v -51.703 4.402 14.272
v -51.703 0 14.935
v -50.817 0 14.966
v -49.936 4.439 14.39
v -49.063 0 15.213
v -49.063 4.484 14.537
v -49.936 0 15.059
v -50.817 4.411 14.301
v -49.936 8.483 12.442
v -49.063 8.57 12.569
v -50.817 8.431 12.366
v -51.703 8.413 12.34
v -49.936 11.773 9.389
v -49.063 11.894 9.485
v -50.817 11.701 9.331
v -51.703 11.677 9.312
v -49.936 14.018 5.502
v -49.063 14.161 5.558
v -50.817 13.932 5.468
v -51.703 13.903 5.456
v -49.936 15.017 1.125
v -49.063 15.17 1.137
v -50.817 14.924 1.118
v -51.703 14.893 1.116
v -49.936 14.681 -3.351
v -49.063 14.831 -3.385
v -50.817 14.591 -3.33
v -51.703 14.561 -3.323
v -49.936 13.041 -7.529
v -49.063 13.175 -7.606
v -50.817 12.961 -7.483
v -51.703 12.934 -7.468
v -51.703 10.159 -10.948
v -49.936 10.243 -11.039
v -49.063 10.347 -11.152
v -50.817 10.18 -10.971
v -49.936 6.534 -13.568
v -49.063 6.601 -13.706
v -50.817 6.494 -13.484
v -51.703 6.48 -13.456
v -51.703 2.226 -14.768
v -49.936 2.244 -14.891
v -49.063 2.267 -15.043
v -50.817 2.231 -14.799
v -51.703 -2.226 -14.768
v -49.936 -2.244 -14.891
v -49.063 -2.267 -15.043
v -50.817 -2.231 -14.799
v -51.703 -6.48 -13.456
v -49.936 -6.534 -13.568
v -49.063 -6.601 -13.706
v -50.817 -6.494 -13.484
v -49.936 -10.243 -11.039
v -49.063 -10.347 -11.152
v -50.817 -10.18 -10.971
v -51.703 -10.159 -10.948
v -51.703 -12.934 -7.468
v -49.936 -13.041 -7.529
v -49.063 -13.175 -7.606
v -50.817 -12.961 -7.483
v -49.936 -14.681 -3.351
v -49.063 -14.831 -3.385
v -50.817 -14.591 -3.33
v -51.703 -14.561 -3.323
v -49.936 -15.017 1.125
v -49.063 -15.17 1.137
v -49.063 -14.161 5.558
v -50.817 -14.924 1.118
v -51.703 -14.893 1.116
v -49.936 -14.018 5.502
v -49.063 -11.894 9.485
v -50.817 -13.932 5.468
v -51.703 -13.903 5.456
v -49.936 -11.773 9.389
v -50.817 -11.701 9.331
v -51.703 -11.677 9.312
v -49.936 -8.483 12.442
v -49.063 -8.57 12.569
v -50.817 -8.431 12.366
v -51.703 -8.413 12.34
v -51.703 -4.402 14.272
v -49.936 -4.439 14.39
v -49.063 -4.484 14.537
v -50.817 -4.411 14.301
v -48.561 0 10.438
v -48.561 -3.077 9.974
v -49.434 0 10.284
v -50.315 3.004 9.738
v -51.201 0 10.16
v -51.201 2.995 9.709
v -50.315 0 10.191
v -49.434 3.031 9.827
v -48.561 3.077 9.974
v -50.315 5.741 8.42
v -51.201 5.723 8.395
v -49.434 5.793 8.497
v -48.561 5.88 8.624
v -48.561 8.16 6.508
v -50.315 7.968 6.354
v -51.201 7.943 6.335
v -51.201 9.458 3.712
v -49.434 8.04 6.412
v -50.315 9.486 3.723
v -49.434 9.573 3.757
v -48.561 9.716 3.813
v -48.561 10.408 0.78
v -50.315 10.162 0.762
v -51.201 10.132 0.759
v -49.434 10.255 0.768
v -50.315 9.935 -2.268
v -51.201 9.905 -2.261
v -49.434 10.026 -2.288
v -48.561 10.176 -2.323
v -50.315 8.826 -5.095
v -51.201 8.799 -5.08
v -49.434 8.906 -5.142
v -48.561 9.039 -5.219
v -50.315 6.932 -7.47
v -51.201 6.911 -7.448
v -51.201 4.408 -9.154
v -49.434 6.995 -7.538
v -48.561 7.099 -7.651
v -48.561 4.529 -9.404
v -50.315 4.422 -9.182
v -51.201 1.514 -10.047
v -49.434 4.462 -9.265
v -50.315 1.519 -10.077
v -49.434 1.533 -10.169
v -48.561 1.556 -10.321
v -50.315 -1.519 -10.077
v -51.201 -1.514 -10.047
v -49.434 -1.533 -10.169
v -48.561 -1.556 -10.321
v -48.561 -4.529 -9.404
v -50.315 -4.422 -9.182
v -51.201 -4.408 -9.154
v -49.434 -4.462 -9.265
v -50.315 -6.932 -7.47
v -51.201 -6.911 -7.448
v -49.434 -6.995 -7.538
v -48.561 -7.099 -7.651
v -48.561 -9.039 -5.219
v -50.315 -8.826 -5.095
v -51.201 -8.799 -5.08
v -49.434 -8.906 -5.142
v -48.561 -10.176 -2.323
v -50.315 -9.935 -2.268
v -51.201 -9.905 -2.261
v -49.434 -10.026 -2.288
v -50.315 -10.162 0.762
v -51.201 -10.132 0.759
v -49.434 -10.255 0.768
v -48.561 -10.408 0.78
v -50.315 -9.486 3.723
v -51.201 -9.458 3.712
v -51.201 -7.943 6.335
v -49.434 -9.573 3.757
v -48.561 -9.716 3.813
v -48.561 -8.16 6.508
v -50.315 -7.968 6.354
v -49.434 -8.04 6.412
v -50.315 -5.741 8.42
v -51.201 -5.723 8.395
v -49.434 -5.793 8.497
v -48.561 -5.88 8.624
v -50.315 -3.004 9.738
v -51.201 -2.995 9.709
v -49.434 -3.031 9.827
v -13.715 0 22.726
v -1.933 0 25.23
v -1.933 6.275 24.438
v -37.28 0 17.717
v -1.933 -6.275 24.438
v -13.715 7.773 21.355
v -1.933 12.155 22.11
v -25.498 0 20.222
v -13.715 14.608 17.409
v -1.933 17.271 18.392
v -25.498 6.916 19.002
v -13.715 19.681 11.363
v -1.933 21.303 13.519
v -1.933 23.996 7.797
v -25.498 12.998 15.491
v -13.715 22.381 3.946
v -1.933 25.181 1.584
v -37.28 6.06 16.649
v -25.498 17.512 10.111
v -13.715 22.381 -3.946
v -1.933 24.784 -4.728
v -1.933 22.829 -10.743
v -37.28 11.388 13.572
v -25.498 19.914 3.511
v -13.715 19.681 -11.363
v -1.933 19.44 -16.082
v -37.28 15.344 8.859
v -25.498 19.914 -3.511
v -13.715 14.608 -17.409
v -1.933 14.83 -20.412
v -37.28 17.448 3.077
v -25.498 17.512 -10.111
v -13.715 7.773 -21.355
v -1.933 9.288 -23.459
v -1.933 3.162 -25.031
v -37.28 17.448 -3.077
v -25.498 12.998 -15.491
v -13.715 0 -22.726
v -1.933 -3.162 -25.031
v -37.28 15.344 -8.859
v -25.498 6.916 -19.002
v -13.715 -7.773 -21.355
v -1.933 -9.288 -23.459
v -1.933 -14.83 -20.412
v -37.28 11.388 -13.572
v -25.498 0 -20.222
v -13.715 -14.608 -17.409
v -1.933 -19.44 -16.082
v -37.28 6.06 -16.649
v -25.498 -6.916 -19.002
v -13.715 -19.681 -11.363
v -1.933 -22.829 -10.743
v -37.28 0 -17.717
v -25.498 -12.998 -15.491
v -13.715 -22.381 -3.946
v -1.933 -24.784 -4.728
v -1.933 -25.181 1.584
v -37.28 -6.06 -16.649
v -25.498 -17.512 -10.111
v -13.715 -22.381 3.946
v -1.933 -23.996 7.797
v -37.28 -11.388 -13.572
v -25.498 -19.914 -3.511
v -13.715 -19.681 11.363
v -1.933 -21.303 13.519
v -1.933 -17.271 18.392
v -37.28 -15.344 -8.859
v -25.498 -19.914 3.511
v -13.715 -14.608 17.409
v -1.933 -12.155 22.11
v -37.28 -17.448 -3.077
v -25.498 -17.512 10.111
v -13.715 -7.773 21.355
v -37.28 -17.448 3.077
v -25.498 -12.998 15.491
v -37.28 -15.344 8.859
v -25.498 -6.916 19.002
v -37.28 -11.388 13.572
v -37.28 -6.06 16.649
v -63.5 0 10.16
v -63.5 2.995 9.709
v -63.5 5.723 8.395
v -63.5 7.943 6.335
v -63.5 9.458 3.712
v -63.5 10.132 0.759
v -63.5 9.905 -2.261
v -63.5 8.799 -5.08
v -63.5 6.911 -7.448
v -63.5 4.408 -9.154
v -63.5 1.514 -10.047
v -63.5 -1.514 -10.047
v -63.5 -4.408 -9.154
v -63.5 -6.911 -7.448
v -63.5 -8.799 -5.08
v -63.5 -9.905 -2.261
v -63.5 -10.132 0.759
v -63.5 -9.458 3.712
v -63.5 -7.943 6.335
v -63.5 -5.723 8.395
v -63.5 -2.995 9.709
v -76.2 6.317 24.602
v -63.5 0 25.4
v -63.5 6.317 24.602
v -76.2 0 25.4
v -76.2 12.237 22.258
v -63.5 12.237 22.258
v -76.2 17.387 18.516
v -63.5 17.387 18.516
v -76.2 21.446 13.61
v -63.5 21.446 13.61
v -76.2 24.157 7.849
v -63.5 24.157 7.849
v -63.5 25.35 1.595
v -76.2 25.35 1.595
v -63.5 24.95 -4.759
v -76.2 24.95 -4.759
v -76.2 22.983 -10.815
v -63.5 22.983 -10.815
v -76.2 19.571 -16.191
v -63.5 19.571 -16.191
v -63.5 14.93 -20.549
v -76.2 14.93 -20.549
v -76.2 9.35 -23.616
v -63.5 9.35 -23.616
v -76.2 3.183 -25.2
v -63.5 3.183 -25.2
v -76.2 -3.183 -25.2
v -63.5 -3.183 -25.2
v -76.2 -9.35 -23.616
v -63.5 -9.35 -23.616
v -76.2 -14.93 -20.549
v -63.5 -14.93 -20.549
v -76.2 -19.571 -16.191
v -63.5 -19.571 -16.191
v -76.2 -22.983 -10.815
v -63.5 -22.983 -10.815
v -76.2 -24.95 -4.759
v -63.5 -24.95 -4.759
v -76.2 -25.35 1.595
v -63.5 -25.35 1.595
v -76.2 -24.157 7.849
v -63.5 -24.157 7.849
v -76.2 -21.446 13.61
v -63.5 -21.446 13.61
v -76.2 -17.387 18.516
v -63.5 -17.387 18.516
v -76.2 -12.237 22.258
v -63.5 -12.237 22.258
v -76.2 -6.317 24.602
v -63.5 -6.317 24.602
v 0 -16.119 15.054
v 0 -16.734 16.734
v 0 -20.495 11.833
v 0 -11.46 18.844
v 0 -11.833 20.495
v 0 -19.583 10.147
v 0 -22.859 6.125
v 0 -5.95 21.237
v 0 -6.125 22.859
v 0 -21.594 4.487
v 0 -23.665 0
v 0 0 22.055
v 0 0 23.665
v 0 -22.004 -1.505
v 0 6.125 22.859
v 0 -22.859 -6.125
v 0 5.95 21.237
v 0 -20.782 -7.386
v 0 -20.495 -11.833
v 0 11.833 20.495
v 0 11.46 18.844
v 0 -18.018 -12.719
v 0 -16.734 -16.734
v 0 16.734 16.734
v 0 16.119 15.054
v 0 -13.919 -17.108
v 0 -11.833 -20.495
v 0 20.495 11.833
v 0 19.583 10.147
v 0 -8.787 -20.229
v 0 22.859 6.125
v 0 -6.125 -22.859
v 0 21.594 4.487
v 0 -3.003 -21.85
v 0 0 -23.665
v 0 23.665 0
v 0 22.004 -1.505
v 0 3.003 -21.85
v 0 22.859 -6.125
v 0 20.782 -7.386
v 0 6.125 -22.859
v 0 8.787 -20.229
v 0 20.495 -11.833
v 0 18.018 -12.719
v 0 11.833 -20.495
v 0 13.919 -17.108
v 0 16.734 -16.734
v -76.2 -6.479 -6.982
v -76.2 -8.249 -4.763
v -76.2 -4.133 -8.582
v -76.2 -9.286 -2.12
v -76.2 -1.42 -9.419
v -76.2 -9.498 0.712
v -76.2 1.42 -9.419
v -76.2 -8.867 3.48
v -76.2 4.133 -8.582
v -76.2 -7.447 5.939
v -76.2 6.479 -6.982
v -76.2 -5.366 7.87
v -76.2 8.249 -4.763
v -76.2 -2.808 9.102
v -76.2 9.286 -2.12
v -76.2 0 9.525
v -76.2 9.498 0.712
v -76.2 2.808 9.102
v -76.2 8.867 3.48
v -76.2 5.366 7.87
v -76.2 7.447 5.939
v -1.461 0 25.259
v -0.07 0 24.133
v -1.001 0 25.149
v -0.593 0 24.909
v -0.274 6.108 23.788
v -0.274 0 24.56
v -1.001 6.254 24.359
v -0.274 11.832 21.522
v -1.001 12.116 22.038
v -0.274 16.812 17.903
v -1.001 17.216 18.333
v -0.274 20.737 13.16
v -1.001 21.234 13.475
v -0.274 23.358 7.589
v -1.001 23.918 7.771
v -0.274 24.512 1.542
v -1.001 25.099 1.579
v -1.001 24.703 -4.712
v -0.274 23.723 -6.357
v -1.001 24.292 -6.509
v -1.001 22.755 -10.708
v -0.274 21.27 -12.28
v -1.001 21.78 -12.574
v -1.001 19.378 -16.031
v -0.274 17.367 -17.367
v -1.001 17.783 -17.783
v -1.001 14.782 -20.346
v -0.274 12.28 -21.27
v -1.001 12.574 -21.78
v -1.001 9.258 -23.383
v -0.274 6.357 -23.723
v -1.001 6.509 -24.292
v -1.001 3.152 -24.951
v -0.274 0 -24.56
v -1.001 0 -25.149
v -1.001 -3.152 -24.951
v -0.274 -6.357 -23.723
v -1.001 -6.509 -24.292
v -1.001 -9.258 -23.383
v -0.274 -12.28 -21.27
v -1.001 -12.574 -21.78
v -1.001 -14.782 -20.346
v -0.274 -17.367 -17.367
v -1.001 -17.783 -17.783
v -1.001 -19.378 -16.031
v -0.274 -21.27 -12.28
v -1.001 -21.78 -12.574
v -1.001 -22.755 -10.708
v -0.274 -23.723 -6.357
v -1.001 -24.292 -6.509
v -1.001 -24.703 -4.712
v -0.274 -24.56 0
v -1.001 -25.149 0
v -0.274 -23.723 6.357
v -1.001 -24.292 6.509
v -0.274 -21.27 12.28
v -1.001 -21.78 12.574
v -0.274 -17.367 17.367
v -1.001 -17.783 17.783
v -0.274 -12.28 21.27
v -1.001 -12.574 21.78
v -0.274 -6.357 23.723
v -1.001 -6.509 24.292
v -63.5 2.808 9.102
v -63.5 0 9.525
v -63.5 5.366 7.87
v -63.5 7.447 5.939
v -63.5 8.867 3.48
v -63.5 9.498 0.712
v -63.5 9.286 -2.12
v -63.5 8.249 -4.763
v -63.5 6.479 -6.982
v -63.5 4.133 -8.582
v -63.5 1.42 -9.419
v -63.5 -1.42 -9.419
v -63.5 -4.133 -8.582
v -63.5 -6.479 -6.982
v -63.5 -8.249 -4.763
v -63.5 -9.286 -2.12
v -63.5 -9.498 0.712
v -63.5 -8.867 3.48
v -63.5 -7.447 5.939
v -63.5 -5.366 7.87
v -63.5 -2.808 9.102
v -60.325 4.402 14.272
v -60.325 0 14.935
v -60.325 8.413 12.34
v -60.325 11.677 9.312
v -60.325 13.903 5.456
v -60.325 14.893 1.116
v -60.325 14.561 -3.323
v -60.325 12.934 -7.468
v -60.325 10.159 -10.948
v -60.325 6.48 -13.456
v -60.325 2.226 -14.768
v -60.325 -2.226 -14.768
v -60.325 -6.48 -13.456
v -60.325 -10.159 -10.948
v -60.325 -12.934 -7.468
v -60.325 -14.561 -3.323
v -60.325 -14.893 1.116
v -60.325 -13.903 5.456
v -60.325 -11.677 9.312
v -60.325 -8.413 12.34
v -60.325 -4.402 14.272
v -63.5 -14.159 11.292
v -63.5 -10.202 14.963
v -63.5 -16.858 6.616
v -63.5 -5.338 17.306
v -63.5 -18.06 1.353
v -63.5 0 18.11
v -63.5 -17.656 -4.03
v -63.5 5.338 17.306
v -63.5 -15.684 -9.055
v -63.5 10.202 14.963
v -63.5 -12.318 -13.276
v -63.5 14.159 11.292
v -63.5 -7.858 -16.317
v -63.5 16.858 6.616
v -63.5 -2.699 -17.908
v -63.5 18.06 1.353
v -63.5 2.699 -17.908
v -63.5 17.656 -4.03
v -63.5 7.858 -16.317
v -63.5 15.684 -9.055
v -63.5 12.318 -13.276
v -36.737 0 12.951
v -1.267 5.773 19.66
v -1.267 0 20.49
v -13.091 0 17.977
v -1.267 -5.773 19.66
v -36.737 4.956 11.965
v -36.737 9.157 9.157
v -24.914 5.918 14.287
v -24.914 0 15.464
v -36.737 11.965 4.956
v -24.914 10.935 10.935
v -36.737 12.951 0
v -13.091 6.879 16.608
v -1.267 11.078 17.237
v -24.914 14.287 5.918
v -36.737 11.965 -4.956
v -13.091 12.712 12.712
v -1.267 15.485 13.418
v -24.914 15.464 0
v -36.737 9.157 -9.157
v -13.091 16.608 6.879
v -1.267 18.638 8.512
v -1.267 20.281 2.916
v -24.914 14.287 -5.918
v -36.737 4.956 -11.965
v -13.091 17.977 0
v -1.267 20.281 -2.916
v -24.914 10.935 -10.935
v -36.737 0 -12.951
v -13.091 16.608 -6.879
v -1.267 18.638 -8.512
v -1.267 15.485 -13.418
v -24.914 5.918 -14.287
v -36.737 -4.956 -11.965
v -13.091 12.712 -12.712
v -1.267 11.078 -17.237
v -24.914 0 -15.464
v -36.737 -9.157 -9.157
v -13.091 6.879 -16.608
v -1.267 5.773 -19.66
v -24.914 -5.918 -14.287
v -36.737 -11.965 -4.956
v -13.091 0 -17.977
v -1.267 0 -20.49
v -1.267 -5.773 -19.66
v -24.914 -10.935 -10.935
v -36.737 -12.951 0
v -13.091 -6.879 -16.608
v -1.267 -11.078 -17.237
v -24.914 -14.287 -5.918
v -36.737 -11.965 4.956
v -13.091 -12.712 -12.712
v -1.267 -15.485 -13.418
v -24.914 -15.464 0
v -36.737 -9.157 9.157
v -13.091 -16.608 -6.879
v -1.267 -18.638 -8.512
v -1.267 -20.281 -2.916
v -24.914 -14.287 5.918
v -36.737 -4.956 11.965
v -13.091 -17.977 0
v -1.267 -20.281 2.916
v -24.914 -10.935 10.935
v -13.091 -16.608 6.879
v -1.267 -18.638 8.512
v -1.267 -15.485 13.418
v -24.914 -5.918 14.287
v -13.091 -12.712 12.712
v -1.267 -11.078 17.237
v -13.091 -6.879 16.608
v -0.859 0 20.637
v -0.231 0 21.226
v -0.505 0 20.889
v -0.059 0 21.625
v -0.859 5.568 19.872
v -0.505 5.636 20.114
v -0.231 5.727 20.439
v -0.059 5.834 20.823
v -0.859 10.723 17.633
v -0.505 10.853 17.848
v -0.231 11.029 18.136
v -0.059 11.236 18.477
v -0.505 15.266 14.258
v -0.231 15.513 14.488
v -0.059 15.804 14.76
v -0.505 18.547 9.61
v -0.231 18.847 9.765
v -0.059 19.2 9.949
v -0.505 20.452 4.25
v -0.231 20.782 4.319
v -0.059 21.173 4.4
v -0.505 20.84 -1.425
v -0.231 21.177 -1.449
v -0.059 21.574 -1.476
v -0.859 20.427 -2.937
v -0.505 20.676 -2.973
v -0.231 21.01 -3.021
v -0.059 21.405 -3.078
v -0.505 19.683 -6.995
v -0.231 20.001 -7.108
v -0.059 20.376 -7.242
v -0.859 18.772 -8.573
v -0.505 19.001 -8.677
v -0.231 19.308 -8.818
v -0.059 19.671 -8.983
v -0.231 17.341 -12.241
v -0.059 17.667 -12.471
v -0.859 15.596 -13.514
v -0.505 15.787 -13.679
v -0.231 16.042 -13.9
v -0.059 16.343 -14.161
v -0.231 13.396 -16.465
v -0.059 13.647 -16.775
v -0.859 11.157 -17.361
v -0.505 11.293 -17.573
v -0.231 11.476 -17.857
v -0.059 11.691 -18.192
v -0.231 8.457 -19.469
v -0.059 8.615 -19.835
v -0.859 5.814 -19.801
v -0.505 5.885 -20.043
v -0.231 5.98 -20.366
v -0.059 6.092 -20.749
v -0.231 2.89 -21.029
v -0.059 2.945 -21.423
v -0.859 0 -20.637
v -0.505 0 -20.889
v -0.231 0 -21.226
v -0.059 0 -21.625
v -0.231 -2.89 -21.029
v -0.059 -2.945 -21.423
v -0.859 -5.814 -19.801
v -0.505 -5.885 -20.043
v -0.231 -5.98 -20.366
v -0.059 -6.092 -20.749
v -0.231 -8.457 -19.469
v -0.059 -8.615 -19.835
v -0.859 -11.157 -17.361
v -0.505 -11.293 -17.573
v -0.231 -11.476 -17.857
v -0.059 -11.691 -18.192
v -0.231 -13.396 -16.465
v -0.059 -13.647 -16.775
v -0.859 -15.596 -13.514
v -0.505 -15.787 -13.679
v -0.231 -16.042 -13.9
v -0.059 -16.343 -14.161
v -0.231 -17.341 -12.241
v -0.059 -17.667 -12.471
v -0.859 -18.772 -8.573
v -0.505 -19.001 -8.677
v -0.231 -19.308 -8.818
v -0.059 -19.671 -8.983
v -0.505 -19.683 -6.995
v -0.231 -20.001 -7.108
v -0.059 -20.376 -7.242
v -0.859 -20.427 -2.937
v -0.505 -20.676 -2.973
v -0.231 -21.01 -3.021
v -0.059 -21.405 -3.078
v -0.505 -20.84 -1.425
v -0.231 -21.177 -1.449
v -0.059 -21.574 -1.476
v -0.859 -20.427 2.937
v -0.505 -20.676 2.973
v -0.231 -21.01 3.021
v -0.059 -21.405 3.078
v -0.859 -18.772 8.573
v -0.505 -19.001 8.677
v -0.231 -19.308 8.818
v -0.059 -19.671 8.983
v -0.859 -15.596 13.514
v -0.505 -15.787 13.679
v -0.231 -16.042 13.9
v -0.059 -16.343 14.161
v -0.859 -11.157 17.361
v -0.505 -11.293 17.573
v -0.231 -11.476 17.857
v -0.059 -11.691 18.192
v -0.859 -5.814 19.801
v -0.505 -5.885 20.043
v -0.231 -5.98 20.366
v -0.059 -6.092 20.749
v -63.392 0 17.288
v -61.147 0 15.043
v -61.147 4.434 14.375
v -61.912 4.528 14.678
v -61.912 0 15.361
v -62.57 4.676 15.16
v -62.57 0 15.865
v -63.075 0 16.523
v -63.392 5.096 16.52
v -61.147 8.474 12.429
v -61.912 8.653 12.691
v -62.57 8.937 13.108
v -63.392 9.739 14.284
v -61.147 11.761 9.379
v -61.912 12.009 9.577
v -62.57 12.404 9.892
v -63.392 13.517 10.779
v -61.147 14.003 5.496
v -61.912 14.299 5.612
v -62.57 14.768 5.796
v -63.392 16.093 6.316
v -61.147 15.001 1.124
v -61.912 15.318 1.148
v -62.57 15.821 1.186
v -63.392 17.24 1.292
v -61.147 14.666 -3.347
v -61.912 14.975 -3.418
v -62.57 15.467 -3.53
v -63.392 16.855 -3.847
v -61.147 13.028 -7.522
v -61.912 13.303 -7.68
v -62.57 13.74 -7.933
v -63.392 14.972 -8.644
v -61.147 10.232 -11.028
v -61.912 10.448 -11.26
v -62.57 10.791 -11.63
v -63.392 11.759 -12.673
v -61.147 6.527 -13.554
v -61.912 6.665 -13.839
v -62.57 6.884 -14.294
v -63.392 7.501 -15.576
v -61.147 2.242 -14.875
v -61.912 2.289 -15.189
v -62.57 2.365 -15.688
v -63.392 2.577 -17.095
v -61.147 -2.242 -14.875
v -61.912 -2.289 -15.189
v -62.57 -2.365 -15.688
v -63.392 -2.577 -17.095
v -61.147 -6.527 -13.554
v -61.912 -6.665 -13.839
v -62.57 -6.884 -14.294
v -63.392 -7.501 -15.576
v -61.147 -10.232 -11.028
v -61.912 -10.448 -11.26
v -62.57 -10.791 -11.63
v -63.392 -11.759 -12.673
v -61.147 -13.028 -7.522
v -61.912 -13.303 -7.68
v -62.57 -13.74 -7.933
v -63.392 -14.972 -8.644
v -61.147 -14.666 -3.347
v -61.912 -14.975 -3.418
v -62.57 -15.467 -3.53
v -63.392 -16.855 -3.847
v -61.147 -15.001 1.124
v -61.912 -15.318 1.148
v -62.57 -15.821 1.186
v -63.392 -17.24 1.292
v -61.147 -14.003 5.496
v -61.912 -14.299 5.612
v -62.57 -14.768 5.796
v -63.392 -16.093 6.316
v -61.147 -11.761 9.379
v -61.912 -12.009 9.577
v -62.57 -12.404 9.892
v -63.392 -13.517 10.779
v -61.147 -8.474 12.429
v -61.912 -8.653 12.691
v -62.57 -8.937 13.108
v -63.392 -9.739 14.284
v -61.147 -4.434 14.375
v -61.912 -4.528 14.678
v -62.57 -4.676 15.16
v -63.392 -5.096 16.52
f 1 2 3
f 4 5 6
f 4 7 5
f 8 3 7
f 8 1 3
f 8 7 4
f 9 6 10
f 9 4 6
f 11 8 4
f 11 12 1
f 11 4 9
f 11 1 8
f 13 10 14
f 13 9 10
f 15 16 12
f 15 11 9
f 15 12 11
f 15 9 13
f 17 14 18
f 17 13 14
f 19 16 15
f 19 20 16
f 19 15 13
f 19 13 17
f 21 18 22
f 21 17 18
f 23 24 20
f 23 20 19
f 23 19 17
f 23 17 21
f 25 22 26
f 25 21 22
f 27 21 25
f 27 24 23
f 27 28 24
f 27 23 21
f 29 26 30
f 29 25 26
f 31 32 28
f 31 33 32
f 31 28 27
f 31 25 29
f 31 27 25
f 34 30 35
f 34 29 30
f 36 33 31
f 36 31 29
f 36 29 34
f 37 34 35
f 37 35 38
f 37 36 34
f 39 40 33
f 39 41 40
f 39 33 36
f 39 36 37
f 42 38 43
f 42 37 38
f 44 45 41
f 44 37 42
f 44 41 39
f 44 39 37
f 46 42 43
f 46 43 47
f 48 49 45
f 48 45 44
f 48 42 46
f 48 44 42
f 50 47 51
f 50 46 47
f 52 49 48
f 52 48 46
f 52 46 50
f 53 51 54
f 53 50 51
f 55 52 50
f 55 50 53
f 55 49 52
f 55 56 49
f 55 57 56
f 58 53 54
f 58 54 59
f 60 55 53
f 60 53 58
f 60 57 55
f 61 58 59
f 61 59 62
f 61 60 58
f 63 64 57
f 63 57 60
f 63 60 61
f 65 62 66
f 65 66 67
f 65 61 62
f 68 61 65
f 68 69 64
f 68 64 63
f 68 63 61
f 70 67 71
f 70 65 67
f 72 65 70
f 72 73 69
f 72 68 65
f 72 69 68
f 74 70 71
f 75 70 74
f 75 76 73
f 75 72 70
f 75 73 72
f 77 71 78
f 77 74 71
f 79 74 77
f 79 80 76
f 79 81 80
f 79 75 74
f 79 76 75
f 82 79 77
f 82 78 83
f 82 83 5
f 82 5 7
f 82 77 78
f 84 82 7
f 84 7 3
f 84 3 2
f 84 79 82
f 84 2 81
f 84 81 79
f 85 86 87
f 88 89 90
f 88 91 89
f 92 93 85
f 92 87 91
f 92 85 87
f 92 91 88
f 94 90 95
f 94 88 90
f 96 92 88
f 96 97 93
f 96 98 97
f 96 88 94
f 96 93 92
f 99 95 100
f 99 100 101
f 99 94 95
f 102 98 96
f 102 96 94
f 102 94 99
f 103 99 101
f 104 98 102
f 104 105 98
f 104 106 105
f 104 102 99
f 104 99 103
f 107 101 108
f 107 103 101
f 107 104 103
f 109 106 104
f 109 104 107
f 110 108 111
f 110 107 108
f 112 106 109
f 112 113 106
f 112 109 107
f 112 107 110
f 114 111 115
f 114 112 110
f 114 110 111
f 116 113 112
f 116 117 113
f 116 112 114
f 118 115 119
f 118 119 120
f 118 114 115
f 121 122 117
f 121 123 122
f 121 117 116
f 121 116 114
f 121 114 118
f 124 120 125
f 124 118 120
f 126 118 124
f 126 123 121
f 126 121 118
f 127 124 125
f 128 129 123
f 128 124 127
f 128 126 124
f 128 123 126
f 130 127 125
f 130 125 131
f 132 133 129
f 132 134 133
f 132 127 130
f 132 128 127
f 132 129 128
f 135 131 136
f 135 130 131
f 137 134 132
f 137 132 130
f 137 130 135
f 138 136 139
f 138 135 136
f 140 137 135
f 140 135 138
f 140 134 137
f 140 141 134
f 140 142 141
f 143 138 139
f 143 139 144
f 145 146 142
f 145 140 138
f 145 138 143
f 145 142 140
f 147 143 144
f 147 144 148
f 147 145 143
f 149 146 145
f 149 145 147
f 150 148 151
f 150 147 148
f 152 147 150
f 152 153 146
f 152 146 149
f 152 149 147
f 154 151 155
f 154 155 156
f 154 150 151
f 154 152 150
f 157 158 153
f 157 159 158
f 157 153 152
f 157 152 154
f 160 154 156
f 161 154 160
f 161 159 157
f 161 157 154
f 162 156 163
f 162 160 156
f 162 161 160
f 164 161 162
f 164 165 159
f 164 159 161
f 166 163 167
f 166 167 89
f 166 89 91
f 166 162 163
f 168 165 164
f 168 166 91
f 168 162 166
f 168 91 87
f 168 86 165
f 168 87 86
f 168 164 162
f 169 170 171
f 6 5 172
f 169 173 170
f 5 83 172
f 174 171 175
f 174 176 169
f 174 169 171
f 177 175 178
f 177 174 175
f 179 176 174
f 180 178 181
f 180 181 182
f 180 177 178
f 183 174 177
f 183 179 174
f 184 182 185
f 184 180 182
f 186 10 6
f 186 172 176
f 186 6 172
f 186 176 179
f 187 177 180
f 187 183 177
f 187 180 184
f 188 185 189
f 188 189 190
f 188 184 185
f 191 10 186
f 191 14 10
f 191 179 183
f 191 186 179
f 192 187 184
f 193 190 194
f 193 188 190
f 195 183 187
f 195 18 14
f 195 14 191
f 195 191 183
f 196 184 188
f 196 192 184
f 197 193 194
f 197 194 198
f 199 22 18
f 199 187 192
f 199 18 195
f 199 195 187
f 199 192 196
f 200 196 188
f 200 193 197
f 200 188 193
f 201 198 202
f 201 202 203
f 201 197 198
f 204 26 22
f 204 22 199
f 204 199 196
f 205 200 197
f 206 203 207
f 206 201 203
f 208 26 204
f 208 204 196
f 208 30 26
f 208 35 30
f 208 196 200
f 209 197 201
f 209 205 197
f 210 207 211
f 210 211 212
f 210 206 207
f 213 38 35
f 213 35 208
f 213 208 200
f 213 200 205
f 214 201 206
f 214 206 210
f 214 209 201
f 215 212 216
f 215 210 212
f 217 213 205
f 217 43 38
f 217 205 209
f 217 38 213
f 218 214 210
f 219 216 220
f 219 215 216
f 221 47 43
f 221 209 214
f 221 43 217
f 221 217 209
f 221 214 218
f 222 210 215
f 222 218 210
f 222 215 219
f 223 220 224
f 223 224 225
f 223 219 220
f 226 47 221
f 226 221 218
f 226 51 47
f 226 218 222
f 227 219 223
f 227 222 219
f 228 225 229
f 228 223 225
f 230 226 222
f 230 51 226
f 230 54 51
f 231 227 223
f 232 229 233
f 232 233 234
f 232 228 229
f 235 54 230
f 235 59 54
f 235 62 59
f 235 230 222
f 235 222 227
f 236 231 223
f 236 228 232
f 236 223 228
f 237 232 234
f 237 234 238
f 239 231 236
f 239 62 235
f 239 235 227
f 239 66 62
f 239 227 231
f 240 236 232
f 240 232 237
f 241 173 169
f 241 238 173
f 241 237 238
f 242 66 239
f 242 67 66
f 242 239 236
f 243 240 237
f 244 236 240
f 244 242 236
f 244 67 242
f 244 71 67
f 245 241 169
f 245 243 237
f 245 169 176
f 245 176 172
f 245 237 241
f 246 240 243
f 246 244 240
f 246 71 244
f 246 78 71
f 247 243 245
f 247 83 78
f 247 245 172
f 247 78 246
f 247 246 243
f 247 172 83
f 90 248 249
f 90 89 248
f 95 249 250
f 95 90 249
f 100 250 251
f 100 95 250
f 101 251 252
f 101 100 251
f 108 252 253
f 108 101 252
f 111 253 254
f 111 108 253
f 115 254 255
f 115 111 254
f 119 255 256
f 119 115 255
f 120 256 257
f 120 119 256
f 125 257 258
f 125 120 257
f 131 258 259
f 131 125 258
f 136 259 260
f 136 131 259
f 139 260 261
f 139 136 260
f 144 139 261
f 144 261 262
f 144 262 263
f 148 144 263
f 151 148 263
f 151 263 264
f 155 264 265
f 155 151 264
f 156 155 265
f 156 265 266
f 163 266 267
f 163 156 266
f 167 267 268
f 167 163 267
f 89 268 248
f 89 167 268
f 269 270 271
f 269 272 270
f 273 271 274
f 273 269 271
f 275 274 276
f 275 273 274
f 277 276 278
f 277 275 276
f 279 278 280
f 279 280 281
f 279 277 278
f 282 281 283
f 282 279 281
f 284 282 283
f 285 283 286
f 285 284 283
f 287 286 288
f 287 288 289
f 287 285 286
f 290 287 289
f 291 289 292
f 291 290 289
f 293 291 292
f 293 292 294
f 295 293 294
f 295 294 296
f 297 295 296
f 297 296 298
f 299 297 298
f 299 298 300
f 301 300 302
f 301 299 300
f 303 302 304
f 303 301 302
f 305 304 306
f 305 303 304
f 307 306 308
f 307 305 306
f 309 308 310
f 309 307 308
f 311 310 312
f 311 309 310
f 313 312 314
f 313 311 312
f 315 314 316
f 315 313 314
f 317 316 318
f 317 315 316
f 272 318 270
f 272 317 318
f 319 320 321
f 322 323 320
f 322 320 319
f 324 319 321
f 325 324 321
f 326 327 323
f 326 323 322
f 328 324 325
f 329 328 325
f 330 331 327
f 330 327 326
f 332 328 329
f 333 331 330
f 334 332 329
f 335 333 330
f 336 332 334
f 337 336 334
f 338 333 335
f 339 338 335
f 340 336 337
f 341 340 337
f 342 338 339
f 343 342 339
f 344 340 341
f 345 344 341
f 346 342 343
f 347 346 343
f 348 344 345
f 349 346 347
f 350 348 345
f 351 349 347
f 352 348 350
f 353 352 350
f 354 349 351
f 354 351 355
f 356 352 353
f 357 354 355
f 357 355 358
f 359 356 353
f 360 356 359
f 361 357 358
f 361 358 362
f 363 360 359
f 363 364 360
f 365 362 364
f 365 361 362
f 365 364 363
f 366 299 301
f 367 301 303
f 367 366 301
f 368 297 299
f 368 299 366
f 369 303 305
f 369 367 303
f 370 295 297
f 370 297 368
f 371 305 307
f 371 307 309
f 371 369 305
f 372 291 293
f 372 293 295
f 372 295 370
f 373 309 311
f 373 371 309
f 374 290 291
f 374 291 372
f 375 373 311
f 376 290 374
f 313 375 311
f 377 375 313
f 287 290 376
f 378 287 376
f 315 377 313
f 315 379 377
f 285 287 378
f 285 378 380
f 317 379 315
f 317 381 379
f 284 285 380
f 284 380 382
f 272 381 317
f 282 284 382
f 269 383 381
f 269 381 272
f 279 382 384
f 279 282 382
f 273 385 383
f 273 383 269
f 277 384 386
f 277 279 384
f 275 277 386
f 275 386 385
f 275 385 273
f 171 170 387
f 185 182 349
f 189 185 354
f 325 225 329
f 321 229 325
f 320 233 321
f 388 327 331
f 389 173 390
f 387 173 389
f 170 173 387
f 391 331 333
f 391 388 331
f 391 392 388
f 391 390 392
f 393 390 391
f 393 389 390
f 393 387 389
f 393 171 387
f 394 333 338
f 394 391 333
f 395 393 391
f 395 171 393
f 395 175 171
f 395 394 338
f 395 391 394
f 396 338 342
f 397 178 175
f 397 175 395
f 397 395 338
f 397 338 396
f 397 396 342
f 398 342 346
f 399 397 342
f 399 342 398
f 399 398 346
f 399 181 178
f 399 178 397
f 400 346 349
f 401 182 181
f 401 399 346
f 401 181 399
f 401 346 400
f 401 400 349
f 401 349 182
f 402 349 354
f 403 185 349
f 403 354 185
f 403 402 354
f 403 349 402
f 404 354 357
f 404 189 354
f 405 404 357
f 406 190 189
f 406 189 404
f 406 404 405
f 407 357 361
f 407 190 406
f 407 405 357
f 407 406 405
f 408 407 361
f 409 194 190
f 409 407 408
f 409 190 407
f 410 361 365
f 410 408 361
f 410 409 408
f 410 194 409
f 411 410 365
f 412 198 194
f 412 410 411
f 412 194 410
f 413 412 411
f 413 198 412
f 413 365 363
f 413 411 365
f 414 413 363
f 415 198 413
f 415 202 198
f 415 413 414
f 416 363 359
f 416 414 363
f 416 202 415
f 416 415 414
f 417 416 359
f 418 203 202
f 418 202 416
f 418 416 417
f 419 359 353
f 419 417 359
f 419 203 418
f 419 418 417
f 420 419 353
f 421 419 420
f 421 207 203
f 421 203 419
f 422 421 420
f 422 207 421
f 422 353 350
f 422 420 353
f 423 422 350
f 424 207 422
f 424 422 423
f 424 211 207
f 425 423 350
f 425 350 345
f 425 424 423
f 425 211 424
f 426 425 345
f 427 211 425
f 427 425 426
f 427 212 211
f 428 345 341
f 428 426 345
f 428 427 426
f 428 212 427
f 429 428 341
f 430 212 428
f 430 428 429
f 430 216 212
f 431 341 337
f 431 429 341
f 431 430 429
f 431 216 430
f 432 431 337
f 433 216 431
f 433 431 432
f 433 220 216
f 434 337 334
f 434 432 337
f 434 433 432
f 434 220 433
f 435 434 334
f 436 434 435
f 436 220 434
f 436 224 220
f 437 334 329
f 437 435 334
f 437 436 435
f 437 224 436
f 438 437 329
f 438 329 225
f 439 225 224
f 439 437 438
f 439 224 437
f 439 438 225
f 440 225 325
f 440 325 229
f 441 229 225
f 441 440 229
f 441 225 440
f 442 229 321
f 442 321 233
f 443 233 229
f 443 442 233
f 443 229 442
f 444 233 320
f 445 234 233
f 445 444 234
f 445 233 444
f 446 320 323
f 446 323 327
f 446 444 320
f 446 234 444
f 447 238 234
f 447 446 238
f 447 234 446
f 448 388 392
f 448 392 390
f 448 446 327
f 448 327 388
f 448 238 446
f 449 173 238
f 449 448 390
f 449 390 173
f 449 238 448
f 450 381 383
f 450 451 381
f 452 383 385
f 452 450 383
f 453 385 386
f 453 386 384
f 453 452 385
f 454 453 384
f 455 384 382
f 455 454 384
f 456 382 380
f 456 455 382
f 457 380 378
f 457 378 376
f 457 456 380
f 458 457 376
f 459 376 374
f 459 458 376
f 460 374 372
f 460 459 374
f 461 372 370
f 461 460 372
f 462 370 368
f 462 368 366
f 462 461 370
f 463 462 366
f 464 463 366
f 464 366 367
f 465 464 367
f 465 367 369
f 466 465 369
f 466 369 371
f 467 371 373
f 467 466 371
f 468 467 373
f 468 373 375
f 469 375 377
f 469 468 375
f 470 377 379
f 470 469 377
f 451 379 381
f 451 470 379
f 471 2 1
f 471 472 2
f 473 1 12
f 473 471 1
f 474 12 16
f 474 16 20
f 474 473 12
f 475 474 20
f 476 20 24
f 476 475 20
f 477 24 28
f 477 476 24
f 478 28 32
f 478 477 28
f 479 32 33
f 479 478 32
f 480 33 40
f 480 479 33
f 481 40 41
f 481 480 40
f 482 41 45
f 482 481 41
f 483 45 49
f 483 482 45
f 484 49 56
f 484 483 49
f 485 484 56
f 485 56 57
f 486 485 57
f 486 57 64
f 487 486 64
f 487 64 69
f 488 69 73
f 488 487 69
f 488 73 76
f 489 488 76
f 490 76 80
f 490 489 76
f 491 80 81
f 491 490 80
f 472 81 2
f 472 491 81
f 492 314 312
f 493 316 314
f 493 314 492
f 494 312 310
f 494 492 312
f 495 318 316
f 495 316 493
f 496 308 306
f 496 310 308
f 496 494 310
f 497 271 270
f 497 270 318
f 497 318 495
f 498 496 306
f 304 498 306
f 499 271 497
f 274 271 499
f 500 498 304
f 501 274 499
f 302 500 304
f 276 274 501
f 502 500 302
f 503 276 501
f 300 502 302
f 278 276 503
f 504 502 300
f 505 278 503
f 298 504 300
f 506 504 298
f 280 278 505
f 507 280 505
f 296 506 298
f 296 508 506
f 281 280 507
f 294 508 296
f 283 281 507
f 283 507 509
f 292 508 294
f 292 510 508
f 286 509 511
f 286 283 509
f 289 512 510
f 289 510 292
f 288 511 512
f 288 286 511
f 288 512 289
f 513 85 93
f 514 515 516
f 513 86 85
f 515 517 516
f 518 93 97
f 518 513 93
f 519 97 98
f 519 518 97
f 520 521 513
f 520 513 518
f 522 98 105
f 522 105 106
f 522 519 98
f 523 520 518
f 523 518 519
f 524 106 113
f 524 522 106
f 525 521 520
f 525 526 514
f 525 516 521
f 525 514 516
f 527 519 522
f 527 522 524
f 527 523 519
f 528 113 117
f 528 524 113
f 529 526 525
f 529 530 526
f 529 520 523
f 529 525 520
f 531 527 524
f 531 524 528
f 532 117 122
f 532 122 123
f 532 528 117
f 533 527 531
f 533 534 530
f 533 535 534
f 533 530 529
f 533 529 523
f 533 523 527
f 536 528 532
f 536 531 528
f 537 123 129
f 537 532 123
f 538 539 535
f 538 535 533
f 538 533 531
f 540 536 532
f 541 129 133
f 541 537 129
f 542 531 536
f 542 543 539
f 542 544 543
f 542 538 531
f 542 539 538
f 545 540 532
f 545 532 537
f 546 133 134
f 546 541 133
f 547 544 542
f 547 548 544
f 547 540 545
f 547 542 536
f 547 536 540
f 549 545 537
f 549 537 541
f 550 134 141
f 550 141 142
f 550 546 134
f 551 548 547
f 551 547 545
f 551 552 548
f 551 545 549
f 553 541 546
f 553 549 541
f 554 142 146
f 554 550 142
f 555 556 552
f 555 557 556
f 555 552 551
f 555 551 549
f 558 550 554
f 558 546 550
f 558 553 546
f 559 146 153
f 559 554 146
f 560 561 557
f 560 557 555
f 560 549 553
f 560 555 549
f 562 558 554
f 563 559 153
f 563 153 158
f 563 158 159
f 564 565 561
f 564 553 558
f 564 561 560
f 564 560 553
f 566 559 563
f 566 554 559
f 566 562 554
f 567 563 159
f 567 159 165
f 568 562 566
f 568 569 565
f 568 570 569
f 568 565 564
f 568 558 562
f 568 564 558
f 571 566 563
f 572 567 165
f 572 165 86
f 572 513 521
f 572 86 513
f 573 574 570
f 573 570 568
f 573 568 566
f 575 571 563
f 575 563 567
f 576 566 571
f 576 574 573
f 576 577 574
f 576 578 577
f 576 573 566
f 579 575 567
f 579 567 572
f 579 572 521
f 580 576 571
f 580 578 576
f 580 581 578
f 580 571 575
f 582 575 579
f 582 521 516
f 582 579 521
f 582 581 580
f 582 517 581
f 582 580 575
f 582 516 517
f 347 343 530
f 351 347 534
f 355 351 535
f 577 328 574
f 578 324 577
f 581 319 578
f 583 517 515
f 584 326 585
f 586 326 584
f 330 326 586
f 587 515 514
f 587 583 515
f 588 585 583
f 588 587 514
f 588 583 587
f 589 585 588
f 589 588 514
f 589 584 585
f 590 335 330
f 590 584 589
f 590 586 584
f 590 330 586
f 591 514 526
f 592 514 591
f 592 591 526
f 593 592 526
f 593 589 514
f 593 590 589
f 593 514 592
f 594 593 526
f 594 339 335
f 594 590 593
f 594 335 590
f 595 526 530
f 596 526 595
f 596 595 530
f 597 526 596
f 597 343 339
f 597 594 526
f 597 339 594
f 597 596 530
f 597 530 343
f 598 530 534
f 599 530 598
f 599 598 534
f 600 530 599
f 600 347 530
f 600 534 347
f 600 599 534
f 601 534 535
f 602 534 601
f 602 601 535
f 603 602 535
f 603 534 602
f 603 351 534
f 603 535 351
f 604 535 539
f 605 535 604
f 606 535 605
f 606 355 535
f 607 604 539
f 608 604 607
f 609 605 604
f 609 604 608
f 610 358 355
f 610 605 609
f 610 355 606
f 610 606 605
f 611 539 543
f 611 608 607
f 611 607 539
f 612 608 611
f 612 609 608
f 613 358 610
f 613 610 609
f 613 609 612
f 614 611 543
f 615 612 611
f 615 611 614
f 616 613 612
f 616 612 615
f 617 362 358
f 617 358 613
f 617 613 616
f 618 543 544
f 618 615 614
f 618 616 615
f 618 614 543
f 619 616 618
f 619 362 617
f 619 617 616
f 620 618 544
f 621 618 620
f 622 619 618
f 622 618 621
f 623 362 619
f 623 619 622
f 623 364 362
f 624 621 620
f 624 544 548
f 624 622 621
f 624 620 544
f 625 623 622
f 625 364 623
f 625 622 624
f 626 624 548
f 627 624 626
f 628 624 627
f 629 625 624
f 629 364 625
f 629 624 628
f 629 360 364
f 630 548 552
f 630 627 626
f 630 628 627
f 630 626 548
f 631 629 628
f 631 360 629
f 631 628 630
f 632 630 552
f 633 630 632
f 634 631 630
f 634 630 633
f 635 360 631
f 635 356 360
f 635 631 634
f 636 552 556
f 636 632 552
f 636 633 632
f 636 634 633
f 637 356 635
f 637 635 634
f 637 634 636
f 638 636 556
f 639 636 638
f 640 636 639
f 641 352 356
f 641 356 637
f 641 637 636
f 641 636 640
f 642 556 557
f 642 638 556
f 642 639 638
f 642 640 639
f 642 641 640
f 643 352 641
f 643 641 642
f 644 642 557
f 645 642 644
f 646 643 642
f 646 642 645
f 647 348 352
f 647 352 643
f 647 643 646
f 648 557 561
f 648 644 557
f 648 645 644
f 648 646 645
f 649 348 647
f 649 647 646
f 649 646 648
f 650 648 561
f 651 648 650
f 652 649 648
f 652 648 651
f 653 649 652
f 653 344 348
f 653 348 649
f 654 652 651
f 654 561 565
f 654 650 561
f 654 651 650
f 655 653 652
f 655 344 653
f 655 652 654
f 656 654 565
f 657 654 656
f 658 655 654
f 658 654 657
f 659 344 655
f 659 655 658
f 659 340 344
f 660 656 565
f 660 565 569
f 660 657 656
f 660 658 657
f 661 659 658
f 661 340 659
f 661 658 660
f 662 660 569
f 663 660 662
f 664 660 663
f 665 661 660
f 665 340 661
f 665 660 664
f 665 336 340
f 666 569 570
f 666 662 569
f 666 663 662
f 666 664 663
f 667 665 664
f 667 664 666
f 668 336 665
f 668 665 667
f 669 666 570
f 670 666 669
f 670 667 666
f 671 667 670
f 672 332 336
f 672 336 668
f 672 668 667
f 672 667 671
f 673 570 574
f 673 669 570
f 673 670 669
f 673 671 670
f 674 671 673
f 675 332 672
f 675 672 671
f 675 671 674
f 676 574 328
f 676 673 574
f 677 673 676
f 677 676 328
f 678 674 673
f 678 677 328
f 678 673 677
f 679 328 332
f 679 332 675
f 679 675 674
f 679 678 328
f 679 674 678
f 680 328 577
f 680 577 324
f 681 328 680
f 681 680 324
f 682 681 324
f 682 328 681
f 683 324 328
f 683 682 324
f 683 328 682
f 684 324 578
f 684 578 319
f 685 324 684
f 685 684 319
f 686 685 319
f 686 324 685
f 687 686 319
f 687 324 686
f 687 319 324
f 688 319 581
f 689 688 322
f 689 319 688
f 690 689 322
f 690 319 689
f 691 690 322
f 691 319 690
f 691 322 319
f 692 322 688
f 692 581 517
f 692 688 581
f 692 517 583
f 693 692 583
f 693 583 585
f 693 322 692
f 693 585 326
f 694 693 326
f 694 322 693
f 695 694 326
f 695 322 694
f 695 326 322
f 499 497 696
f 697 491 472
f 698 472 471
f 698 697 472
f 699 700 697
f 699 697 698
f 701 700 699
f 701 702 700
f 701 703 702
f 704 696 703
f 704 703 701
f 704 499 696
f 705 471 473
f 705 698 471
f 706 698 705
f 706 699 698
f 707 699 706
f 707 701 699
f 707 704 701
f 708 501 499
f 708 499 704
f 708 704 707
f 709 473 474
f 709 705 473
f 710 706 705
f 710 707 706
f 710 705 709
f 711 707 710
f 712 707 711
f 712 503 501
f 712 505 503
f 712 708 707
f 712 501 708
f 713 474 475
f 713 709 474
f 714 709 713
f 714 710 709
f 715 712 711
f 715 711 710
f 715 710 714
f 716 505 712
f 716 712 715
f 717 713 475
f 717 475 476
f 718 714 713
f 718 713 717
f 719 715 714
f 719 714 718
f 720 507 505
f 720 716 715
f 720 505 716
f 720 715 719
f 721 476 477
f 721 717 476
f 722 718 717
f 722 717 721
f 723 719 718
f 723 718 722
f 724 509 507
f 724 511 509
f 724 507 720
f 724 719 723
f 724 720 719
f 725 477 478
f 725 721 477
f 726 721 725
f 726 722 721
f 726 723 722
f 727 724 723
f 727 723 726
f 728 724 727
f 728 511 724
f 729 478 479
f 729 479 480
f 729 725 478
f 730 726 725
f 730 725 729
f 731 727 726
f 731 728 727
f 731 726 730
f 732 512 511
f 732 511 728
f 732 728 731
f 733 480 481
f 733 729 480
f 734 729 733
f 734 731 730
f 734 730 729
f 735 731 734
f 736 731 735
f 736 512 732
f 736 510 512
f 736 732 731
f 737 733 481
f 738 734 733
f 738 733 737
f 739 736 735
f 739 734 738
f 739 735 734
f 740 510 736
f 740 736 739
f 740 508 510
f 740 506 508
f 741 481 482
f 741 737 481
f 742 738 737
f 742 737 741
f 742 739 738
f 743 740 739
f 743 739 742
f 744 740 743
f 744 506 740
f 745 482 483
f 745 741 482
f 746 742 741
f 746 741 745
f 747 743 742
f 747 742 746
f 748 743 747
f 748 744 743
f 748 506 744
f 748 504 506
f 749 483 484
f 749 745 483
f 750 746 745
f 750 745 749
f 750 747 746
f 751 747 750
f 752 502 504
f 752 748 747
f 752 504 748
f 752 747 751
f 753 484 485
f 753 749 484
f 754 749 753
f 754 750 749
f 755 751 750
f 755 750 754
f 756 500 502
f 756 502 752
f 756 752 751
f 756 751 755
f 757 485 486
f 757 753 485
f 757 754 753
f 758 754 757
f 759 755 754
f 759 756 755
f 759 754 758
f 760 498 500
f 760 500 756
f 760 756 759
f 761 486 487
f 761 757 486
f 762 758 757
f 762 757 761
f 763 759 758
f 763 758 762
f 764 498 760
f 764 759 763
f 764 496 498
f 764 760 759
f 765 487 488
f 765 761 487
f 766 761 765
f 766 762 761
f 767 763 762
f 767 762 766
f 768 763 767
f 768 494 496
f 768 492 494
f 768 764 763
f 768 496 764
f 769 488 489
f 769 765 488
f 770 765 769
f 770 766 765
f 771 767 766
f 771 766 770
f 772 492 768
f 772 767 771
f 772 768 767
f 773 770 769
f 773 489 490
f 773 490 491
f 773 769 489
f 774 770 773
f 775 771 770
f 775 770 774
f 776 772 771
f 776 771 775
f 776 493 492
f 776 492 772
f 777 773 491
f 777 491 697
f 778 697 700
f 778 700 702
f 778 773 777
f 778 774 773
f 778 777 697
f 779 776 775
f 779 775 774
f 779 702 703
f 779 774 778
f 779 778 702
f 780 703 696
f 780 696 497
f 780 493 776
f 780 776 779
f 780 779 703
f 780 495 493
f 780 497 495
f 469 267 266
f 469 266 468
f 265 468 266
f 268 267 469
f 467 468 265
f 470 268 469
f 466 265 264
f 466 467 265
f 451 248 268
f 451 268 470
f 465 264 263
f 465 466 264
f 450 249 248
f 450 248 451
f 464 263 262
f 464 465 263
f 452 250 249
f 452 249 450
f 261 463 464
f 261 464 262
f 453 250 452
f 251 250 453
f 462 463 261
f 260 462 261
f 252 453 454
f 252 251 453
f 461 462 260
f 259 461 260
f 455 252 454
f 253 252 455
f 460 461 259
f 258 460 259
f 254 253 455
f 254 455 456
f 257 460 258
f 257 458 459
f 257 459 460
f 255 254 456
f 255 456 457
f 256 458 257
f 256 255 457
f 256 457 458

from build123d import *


with BuildPart() as part:
    # Sketch1 → Revolve3 (revolve)
    with BuildSketch(Plane(origin=(0, 0, 0), x_dir=(1, 0, 0), z_dir=(0, 1, 0))):
        with BuildLine():
            Line((-1.932900288, -25.23044077), (-49.062545314, -15.212725471))
            ThreePointArc((-49.062545314, -15.212725471), (-50.375512304, -15.004771929), (-51.703023788, -14.9352))
            Line((-51.703023788, -14.9352), (-60.325, -14.9352))
            ThreePointArc((-60.325, -14.9352), (-62.57006403, -15.86513597), (-63.5, -18.1102))
            Line((-63.5, -18.1102), (-63.5, -25.4))
            Line((-63.5, -25.4), (-76.2, -25.4))
            Line((-76.2, -25.4), (-76.2, -9.525))
            Line((-76.2, -9.525), (-63.5, -9.525))
            Line((-63.5, -9.525), (-63.5, -10.16))
            Line((-63.5, -10.16), (-51.201130044, -10.16))
            ThreePointArc((-51.201130044, -10.16), (-49.87361856, -10.229571929), (-48.56065157, -10.437525471))
            Line((-48.56065157, -10.437525471), (-1.267499712, -20.48999522))
            ThreePointArc((-1.267499712, -20.48999522), (-0.356611032, -21.048188521), (0, -22.055227011))
            Line((0, -22.055227011), (0, -23.66520898))
            ThreePointArc((0, -23.66520898), (-0.59316151, -24.908797947), (-1.932900288, -25.23044077))
        make_face()
    revolve(axis=Axis((88.99, 0, 0), (-1, 0, 0)))


solid = part.part
